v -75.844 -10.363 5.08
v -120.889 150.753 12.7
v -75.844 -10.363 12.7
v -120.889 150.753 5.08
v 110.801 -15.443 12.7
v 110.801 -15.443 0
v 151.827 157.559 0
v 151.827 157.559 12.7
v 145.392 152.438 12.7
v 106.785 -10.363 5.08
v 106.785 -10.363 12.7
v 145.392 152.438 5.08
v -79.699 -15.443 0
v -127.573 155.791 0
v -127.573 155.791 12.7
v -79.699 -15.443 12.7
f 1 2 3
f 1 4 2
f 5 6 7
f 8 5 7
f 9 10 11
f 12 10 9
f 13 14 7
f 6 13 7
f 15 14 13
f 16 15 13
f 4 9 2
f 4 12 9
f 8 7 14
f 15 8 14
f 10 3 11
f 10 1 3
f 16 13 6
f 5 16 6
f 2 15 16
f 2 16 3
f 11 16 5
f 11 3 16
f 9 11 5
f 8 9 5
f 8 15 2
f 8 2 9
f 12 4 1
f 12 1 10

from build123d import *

# Parameters (mm, degrees)
F1_DEPTH = 12.7
F2_T     = -5.08


with BuildPart() as f1:
    # F0 (on Top) → F1 (new body)
    with BuildSketch(Plane.XY):
        Polygon((-127.572568, 155.790623), (-79.69885, -15.442981), (110.80115, -15.442981), (151.827432, 157.558996), align=None)
    extrude(amount=F1_DEPTH)

    # F2
    f2_openings = [f1.faces().sort_by_distance(p)[0] for p in [
        (13.894392, 76.045407, 12.7),
    ]]
    offset(amount=F2_T, openings=f2_openings)


solid = f1.part
